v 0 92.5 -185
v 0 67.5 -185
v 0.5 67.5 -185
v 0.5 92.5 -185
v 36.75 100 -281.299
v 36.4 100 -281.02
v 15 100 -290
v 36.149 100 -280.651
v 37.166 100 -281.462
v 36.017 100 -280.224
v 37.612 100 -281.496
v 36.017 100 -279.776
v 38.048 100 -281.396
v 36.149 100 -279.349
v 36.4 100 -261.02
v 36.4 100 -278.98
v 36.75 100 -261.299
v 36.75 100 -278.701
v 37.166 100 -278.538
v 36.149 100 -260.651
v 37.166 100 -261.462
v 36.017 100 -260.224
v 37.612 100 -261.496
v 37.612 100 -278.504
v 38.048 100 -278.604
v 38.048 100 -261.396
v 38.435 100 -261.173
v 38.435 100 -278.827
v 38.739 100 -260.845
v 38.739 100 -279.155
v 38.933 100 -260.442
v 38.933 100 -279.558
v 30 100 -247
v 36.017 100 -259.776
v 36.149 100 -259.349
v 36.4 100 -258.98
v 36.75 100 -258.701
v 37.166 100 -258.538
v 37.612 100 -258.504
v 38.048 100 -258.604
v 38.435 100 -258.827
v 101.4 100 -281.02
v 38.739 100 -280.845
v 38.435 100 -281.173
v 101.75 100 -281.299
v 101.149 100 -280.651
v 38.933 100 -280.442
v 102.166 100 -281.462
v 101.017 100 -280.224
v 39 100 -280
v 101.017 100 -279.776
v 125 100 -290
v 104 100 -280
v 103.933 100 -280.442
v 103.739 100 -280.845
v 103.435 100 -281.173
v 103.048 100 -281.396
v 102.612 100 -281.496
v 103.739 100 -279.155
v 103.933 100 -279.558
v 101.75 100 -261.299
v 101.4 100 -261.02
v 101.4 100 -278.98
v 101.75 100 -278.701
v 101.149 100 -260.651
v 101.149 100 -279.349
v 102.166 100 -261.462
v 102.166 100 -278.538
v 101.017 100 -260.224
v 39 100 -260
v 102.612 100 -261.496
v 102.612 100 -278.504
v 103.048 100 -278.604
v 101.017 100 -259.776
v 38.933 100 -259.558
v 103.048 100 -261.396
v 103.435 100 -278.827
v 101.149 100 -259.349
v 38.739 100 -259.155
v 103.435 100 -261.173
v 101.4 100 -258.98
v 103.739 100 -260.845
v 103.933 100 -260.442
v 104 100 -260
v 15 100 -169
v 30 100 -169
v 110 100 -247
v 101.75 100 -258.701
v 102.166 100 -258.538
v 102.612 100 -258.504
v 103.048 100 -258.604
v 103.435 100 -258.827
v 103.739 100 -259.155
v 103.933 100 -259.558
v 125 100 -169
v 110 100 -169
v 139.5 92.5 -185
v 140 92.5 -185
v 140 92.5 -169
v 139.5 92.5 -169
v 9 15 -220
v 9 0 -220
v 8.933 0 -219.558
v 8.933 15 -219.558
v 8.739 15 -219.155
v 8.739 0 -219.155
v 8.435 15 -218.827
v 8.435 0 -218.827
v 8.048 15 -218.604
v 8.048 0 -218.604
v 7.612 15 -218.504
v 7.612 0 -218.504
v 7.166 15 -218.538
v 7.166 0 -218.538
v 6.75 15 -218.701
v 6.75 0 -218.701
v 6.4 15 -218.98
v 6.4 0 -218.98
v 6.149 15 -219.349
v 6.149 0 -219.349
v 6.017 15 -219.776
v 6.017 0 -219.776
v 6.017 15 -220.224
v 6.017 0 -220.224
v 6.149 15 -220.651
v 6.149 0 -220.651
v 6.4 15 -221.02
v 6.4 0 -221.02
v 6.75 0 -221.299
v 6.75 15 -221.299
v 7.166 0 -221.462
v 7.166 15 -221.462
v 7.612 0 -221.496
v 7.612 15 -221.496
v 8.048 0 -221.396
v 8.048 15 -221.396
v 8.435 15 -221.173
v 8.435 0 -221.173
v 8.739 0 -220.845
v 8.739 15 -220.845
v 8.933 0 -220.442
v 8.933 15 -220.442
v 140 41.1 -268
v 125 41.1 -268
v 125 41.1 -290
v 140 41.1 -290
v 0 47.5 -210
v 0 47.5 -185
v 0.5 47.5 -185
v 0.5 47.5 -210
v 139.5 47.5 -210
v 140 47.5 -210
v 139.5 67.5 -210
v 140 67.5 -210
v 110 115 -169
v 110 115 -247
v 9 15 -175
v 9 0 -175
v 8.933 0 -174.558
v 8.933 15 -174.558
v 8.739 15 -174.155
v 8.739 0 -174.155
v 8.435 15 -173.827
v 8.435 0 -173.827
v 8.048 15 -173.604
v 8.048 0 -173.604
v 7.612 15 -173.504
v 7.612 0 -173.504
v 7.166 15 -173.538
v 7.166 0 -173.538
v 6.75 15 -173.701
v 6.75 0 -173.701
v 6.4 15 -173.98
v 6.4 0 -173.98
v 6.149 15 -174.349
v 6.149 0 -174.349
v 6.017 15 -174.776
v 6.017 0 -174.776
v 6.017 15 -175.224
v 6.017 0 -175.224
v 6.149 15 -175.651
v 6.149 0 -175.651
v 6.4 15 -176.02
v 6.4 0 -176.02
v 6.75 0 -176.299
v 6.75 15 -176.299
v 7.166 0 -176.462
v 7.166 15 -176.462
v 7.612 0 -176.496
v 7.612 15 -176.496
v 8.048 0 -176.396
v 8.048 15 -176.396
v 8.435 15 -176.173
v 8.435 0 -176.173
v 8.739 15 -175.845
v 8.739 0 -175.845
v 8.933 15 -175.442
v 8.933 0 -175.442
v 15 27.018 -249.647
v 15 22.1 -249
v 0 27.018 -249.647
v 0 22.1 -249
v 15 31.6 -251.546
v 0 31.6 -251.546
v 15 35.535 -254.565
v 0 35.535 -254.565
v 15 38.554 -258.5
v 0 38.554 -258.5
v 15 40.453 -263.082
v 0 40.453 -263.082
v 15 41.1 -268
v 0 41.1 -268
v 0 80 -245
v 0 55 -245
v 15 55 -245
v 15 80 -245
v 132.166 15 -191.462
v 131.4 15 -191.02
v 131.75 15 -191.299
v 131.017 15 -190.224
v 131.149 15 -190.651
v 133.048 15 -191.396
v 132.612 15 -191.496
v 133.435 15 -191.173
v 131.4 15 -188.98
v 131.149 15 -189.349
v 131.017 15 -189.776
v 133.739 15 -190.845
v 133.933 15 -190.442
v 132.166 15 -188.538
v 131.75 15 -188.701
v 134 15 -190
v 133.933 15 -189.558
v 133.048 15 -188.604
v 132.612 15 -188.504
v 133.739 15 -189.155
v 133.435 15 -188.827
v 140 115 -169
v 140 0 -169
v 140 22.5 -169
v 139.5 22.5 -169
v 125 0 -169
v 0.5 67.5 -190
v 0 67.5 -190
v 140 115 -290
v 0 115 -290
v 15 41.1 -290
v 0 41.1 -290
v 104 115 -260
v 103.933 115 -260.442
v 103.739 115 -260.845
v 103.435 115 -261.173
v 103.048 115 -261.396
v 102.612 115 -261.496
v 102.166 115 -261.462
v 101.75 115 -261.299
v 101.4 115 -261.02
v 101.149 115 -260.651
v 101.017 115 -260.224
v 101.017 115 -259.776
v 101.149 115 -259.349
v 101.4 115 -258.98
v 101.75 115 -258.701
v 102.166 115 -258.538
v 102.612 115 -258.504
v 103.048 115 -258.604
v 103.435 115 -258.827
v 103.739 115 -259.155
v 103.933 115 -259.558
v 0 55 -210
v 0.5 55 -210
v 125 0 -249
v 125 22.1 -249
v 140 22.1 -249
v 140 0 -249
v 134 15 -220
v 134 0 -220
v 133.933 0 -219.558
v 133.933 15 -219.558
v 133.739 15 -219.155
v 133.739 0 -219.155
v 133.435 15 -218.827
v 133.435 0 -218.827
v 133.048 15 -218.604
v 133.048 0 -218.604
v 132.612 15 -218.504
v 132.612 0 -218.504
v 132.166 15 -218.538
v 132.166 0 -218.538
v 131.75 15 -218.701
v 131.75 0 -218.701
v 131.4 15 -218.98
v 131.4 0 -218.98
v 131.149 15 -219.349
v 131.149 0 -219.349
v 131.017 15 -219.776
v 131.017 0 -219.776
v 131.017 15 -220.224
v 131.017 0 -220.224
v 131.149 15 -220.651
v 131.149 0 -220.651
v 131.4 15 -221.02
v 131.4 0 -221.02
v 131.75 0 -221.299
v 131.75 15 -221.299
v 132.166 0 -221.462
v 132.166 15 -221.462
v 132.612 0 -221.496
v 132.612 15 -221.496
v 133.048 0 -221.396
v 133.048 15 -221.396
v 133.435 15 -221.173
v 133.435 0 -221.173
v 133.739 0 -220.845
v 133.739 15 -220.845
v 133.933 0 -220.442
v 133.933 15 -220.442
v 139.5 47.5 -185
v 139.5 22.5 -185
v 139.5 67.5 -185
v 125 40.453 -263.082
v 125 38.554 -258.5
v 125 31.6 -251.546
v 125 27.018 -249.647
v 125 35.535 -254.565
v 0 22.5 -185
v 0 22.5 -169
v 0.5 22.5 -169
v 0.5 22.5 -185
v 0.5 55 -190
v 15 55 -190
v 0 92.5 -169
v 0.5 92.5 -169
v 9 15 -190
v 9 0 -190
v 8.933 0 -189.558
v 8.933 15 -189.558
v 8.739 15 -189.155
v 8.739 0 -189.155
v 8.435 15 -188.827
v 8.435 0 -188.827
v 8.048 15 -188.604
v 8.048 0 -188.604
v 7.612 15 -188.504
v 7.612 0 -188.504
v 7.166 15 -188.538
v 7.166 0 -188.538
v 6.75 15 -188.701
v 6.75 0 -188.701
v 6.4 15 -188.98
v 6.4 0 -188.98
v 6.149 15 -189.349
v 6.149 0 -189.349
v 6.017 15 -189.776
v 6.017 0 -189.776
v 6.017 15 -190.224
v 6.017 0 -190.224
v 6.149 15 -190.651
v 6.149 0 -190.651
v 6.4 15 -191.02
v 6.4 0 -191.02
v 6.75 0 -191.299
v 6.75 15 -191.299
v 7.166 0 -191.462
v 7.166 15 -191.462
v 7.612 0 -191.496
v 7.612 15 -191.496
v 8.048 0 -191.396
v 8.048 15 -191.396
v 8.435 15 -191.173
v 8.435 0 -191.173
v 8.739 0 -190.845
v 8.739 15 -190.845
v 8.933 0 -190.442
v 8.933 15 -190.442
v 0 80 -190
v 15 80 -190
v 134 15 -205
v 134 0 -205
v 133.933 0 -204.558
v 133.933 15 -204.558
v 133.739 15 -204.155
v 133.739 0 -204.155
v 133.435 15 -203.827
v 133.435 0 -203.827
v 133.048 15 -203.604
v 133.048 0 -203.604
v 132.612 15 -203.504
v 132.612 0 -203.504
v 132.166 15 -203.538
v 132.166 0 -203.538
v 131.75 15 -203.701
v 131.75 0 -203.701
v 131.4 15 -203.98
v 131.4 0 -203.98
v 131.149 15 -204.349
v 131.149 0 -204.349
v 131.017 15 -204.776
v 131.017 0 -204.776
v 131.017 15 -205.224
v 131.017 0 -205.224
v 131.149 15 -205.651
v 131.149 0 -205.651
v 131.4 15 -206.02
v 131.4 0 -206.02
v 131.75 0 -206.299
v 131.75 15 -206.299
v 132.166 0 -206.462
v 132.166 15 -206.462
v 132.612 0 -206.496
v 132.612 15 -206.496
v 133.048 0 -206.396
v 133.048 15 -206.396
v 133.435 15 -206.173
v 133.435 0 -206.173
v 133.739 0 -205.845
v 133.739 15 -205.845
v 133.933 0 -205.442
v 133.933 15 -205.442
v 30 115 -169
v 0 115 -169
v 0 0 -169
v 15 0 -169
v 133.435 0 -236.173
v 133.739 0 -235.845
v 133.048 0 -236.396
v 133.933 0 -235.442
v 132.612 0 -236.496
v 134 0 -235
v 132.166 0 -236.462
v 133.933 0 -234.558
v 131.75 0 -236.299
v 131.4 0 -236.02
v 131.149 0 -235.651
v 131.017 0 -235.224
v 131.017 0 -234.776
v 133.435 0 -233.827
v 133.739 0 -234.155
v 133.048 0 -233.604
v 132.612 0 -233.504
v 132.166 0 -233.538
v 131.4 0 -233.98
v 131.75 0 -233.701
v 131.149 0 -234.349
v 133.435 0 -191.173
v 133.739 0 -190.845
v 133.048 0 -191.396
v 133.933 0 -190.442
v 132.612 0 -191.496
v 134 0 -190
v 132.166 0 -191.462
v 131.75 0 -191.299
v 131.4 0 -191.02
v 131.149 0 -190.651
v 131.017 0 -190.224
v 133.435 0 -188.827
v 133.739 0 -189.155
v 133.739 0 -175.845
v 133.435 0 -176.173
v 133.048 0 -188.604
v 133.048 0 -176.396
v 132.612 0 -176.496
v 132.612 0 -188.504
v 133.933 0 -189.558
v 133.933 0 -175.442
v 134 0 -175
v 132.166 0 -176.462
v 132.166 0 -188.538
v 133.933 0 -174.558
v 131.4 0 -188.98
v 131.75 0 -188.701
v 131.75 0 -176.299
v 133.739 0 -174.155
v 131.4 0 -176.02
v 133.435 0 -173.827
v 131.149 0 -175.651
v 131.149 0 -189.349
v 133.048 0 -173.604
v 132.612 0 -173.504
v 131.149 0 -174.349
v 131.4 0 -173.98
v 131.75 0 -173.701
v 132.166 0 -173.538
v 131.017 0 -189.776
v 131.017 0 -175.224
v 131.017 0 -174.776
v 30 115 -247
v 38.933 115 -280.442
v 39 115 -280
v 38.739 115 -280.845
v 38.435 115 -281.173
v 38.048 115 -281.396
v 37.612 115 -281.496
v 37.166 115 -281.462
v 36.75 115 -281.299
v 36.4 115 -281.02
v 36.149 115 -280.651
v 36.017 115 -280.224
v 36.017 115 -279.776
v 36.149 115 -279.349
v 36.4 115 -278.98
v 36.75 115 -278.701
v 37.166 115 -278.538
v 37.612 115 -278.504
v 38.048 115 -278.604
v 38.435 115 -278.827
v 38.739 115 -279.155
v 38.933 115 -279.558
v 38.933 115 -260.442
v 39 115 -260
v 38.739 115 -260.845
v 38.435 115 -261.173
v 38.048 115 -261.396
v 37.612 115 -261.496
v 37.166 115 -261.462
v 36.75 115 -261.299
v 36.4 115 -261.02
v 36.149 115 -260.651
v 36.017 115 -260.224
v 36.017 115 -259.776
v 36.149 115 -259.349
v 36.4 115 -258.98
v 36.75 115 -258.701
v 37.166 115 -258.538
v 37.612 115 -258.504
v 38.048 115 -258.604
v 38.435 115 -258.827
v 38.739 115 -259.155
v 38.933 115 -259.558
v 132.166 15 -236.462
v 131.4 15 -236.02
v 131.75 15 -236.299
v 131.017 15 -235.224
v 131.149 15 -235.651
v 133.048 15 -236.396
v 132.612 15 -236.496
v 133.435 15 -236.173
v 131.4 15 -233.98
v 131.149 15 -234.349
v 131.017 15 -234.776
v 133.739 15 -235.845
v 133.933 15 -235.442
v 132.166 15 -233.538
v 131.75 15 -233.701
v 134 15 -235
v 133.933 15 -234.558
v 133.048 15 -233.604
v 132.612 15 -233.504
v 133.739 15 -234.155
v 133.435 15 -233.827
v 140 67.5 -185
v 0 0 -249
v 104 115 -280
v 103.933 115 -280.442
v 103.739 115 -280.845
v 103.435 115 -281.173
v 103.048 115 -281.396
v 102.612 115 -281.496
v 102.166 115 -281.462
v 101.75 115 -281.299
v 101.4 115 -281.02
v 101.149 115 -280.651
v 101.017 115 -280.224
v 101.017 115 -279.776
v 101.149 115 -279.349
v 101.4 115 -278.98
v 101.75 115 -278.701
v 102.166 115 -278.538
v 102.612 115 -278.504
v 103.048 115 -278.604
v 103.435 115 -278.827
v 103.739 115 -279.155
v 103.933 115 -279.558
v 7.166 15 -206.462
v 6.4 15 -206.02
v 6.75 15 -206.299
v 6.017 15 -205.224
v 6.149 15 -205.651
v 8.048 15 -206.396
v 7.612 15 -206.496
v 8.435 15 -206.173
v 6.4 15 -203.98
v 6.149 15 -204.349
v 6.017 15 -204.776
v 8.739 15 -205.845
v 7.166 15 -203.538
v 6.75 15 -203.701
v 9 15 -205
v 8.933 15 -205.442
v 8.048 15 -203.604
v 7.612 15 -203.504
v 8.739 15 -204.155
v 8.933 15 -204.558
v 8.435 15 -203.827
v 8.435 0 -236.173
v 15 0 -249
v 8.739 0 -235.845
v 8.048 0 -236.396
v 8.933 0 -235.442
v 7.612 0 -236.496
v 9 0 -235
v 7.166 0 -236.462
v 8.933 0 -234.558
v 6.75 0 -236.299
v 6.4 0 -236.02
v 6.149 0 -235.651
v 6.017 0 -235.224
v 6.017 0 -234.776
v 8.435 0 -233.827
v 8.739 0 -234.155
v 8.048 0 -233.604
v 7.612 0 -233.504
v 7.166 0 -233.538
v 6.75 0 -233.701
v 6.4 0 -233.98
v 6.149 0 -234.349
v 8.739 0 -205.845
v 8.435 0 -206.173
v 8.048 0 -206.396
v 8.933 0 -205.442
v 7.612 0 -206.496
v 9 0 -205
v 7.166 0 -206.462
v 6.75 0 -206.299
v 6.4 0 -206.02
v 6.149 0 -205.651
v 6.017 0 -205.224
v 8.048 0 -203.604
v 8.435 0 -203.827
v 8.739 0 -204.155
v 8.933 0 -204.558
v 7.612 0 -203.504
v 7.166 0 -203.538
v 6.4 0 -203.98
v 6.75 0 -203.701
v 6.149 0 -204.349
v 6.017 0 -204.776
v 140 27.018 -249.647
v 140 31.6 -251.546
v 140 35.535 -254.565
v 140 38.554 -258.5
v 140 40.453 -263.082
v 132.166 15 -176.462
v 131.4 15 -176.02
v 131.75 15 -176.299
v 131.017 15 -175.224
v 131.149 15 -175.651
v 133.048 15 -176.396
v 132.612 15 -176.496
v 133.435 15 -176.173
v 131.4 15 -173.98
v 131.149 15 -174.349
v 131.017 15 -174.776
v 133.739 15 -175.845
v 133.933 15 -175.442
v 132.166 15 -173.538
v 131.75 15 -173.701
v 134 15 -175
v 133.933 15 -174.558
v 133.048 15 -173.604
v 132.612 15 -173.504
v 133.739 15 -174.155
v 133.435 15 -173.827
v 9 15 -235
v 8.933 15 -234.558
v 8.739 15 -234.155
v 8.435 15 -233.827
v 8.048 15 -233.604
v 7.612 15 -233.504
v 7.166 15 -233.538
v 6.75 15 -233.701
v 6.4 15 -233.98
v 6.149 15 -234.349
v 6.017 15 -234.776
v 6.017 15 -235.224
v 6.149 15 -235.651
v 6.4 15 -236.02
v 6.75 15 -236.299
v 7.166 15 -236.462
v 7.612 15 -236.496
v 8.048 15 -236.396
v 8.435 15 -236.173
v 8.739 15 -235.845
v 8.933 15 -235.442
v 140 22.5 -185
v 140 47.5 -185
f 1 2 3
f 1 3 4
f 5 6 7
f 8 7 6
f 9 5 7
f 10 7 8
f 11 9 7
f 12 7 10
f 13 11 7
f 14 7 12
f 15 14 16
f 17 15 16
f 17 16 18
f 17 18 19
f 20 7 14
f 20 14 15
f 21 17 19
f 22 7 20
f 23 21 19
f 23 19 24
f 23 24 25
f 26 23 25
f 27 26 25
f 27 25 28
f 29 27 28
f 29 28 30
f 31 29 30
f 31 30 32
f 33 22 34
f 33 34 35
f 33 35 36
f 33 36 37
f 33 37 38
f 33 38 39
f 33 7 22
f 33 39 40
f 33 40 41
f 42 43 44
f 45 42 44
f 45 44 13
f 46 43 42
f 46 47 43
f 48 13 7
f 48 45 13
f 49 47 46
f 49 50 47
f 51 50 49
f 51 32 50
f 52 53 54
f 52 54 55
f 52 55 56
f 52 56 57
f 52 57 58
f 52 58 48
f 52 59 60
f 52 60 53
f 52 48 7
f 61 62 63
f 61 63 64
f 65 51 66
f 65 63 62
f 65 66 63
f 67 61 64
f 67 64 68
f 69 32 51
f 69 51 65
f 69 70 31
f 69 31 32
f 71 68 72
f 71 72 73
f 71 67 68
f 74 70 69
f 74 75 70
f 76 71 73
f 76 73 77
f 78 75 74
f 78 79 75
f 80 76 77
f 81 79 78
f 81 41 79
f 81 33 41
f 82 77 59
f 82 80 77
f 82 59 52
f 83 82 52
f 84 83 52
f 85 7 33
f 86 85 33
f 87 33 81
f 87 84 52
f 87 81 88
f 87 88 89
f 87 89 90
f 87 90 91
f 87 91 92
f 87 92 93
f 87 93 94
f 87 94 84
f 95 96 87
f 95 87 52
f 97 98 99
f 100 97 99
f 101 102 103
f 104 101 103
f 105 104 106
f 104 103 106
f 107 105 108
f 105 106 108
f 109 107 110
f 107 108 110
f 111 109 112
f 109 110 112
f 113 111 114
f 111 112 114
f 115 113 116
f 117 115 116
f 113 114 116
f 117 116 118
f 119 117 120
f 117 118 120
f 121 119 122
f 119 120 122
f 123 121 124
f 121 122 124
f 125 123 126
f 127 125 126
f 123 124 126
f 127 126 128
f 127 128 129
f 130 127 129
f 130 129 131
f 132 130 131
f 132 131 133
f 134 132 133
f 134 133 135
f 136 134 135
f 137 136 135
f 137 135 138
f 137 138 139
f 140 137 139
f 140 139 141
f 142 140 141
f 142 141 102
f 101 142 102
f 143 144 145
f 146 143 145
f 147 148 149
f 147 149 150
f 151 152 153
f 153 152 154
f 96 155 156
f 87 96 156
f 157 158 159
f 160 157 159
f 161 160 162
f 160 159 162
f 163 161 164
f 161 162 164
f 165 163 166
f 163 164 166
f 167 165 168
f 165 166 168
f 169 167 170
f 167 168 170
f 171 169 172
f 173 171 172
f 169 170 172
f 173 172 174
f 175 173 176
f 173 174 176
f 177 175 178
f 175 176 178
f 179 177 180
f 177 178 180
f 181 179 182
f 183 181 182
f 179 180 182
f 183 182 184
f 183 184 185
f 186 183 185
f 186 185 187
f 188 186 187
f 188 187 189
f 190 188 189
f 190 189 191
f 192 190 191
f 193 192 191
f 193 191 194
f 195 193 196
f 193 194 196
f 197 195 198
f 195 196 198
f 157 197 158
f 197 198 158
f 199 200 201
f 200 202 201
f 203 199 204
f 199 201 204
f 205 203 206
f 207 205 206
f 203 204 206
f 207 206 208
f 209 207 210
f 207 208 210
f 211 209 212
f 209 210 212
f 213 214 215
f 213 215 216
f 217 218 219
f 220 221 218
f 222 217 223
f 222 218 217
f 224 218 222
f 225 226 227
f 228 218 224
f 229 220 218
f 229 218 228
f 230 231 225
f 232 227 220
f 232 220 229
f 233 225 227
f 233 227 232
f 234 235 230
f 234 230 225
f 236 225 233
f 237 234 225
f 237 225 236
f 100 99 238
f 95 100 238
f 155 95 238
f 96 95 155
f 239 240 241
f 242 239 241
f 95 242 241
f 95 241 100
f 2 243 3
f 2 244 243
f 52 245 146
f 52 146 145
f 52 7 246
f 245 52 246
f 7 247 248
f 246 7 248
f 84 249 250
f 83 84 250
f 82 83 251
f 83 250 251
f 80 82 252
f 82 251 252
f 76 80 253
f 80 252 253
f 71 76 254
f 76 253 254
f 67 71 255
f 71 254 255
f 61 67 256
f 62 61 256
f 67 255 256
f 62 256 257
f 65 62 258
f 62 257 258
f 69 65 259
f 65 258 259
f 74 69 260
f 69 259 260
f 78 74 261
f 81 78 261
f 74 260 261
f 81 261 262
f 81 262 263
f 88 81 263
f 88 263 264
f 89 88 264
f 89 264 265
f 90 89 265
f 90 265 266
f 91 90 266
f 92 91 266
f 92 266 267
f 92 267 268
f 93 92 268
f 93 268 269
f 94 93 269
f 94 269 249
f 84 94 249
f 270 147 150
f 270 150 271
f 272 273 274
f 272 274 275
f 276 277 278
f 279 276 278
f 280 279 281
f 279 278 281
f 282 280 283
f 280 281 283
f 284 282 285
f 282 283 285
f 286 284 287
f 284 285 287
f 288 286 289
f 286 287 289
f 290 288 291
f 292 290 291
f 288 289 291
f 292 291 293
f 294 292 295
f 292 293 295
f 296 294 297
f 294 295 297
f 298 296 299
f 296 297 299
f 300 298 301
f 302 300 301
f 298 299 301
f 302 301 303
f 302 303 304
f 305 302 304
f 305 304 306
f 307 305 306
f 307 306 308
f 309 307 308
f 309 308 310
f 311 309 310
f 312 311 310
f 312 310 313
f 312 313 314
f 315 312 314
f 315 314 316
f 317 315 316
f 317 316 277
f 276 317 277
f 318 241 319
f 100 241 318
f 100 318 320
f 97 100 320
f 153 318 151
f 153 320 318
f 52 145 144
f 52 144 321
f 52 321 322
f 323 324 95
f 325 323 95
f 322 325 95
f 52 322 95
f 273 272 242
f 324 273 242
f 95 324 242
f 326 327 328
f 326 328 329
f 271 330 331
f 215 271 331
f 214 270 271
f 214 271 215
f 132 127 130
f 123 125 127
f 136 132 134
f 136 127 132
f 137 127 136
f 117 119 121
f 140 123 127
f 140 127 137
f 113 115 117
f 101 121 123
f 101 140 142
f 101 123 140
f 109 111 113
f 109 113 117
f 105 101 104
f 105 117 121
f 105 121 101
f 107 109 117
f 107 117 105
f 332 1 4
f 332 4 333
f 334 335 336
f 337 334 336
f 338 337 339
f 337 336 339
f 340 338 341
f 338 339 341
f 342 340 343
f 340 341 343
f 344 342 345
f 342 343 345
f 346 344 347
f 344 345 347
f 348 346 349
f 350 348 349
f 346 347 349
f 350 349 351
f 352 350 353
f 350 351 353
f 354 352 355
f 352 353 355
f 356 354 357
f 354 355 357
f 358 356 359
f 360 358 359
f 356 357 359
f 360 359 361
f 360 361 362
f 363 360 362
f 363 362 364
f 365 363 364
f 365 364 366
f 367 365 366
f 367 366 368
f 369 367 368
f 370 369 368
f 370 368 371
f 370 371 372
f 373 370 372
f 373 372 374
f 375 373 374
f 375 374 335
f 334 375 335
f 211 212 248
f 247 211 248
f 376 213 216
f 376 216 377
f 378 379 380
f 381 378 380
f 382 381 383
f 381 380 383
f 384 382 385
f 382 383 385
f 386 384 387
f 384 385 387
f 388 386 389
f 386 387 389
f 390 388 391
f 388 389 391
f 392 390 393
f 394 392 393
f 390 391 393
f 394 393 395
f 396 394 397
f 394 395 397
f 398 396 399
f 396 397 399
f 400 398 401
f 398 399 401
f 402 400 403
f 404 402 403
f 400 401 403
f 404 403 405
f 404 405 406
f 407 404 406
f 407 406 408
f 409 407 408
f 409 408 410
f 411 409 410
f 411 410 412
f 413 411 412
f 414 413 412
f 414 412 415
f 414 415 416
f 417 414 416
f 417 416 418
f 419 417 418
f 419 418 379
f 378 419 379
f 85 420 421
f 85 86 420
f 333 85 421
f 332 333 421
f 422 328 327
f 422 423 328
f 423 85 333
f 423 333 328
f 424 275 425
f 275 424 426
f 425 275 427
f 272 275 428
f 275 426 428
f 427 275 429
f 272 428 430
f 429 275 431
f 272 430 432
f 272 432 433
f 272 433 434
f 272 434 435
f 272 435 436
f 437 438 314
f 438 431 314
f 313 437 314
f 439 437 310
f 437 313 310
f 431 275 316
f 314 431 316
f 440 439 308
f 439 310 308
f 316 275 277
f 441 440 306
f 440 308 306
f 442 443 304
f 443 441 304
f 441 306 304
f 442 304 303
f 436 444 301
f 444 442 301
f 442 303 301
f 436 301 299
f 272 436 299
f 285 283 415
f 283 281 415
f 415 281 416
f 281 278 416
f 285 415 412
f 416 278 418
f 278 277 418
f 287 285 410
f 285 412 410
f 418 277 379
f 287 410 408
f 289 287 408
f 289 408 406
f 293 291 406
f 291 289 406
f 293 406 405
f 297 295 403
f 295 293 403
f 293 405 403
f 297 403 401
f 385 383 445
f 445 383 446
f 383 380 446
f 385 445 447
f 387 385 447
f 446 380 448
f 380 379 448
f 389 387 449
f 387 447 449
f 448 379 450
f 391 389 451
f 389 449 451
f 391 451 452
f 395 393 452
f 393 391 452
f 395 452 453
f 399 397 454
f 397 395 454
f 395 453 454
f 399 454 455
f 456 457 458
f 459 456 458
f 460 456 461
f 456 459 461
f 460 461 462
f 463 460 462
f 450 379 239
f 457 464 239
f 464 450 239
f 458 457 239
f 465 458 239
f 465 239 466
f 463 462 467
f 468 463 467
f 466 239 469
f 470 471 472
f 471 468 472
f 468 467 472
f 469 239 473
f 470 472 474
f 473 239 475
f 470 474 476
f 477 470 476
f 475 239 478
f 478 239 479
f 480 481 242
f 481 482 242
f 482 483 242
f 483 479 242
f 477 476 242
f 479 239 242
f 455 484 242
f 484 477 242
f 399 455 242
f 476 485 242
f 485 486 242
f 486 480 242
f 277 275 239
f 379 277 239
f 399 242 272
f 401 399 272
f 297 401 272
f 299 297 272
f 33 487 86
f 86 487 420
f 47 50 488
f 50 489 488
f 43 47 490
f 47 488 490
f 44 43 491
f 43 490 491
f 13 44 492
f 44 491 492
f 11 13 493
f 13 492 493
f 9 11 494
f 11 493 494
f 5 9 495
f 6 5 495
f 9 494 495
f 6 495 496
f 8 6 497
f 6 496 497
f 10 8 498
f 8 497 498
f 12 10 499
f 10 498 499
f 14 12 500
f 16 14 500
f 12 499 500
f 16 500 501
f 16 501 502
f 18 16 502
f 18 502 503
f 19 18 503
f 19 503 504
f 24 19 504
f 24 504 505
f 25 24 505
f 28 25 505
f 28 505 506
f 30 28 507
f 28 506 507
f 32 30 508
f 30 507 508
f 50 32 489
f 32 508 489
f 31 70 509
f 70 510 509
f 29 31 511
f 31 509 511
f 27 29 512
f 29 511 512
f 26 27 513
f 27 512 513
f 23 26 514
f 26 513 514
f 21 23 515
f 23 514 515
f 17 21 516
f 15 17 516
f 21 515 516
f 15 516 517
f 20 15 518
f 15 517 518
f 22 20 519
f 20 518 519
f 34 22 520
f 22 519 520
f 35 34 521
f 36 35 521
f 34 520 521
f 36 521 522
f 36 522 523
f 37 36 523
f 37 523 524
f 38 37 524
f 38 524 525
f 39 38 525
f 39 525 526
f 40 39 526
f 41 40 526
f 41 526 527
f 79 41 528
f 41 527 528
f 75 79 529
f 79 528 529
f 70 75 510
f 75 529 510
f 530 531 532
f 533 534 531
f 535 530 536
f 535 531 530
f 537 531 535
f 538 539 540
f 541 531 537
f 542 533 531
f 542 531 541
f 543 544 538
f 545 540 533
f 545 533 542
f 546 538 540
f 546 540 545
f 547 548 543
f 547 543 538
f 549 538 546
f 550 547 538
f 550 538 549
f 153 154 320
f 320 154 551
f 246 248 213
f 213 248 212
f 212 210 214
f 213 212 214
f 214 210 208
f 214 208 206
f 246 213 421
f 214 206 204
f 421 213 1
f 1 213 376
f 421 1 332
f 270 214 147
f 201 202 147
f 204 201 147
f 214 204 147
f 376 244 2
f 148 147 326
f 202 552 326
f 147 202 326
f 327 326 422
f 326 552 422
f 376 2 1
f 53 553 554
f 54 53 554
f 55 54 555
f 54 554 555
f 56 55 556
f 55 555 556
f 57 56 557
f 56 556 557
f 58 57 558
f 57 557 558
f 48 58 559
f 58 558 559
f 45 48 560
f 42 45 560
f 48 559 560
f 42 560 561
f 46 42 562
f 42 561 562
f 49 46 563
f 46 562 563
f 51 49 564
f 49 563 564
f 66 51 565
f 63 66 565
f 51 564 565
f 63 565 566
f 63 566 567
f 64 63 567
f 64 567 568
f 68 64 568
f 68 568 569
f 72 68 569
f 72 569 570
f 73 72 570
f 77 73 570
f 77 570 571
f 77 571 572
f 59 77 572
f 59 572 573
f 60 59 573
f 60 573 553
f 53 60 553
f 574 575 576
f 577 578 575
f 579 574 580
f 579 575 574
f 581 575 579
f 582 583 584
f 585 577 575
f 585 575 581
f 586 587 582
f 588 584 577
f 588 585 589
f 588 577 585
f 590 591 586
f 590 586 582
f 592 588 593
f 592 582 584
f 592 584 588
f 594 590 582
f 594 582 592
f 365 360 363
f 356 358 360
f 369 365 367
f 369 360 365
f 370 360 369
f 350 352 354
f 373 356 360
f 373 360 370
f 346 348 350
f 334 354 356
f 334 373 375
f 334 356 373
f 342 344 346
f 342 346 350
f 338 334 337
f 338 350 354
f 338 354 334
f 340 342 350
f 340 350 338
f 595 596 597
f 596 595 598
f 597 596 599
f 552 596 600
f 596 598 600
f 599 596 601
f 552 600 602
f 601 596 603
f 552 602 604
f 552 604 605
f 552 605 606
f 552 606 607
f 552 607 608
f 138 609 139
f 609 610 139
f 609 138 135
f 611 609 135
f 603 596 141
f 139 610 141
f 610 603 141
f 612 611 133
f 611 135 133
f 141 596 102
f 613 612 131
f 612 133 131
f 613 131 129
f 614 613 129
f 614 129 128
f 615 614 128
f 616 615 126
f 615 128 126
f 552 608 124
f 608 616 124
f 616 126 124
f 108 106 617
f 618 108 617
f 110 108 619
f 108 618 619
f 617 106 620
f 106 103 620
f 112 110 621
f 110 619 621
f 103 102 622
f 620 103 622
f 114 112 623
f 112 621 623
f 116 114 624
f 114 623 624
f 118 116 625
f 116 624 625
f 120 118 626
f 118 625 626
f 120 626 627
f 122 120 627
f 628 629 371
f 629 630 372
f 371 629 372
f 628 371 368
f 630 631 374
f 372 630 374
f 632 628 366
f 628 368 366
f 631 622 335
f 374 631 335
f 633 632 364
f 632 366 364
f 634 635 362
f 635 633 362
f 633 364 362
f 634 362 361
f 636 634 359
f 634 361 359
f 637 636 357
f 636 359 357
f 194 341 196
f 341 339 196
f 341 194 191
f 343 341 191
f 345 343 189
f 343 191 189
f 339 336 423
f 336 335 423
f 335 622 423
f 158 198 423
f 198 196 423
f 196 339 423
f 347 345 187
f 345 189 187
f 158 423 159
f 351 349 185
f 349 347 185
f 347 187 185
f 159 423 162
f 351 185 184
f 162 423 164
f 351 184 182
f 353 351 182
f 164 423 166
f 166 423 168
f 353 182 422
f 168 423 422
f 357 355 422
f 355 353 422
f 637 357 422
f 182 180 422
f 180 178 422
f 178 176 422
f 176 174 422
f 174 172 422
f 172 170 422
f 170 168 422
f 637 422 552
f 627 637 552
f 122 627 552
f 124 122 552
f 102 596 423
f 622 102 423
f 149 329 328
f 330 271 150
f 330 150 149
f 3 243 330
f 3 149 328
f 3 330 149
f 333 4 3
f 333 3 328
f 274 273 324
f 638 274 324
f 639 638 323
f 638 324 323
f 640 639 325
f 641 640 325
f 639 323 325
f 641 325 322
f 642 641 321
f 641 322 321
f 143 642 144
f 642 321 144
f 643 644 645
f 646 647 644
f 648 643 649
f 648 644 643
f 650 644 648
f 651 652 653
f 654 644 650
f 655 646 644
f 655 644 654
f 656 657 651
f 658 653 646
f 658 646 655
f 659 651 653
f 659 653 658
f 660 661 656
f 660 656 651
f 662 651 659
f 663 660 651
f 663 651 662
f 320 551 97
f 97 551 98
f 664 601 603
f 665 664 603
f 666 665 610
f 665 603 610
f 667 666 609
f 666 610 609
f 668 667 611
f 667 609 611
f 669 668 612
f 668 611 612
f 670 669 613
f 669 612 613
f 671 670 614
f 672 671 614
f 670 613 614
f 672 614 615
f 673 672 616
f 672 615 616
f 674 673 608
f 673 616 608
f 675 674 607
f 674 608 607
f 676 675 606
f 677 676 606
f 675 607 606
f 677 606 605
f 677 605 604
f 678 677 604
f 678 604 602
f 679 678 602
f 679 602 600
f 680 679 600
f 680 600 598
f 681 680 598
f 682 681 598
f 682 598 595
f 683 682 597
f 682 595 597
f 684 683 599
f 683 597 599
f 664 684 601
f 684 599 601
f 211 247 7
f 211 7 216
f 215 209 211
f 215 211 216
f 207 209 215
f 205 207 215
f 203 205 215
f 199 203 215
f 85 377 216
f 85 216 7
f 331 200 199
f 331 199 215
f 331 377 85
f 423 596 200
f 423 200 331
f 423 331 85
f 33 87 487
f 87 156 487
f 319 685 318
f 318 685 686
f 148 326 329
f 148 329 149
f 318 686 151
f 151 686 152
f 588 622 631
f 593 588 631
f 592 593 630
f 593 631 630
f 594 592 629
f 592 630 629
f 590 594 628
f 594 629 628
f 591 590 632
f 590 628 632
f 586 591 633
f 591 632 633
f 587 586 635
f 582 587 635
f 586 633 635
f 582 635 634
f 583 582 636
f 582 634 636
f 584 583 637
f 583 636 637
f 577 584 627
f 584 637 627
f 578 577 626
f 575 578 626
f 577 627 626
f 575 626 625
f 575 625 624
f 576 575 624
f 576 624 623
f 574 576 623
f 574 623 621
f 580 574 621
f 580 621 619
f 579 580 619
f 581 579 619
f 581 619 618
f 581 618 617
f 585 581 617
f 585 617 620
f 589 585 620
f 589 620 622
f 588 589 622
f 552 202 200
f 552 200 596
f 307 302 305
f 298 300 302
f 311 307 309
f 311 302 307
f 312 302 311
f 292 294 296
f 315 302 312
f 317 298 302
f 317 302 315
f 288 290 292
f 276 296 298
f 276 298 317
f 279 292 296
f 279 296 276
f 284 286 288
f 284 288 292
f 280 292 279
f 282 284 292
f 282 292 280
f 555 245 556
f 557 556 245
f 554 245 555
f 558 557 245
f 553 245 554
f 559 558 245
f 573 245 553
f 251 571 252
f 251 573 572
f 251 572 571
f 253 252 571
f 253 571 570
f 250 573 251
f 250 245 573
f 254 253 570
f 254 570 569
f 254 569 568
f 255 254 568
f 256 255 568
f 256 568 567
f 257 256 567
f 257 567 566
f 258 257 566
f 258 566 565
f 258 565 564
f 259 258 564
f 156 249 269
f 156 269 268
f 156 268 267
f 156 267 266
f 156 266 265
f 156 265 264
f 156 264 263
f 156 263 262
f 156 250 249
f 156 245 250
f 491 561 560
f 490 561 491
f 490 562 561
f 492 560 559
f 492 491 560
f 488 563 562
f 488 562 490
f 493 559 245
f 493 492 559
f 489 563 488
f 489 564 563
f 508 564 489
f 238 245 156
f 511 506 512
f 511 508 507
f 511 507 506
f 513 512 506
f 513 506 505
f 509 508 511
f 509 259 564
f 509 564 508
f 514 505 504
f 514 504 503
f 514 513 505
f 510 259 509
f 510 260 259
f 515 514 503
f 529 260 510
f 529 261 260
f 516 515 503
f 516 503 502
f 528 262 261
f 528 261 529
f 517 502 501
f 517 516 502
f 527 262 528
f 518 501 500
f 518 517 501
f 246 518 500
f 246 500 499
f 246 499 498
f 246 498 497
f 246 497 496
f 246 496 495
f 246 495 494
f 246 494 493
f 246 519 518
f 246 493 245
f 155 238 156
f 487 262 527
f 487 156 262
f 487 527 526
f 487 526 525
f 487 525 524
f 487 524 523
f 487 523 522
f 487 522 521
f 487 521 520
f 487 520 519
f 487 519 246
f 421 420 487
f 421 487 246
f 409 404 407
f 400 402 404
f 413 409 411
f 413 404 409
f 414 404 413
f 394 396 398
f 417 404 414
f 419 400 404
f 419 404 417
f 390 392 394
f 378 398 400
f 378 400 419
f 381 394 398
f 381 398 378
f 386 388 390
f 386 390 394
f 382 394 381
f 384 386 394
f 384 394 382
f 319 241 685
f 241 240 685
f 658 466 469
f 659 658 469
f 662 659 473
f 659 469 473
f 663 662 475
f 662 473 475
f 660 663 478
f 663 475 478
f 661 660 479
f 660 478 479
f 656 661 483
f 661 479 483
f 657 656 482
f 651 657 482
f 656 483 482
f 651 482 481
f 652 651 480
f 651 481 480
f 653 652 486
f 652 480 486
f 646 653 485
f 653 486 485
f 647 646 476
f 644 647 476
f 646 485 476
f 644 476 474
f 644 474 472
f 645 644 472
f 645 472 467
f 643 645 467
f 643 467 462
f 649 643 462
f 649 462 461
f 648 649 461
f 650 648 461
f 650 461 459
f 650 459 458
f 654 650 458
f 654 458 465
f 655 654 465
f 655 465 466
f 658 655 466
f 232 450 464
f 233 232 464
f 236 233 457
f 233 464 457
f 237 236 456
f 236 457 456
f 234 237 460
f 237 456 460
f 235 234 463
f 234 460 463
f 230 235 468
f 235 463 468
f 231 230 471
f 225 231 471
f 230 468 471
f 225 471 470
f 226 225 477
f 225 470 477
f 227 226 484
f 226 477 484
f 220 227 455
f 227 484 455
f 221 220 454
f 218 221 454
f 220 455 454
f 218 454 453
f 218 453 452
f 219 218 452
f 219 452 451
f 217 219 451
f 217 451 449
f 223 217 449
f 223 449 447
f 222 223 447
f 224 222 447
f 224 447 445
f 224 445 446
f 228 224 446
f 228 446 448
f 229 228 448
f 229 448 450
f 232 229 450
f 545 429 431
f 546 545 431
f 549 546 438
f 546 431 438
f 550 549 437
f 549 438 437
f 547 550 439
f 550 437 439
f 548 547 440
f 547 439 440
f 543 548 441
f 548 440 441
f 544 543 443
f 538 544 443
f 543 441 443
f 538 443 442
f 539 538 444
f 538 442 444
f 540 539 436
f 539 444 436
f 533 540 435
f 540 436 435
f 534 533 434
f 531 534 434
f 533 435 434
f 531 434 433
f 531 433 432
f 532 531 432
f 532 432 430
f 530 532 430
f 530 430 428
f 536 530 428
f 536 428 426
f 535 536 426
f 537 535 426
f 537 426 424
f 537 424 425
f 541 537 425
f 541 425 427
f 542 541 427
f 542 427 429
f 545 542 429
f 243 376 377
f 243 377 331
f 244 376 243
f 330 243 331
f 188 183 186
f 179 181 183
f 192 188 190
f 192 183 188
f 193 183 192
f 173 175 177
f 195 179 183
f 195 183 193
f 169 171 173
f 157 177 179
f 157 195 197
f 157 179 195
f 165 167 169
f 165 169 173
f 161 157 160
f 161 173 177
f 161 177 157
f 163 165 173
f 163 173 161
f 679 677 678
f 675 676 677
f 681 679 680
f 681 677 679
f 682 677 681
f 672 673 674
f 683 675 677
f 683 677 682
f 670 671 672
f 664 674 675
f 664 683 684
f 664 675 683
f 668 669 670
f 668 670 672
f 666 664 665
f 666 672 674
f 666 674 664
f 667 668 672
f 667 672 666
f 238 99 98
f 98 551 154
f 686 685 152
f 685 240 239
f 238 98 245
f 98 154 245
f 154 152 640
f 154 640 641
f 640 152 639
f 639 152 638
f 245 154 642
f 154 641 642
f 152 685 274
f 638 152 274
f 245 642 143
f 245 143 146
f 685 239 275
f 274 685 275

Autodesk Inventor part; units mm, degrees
sketch "Sketch1" plane through (0, 0, 0) normal (0, 1, 0) x (-1, 0, 0)
  line L0 (0, 0) -> (-140, 0)
  line L1 (-140, 0) -> (-140, -290)
  line L2 (-140, -290) -> (0, -290)
  line L3 (0, -290) -> (0, 0)
  line L4 (0, -70) -> (-50, 0)
  line L5 (-90, 0) -> (-140, -70)
  dimension "d0" = 290
  dimension "d1" = 140
  dimension "d2" = 70
  dimension "d3" = 50
  dimension "d4" = 50
extrude "Extrusion1" add sketch "Sketch1" along normal blind 115 contours L4 L3 L2 L1 L5 L0
sketch "Sketch2" plane through (140, 0, -70) normal (1, 0, 0) x (0, 0, -1)
  line L0 (-70, 0) -> (-70, 115) projected
  line L1 (-70, 45) -> (0, 65)
  line L2 (0, 0) -> (0, 115) projected
  line L3 (0, 65) -> (40, 115)
  line L4 (220, 115) -> (0, 115) projected
  line L5 (-70, 0) -> (0, 0) projected
  line L6 (0, 0) -> (0, 115) projected
  line L7 (-70, 115) -> (0, 115) projected
  line L8 (-70, 0) -> (-70, 115) projected
  point P0 (0, 115)
  dimension "d7" = 20
  dimension "d8" = 45
  dimension "d9" = 40
extrude "Extrusion2" cut sketch "Sketch2" against normal up to next contours L0 L7 L2 L1
extrude "Extrusion3" cut sketch "Sketch2" against normal up to next contours L2 L4 L3
sketch "Sketch5" plane through (50, 45, 0) normal (0, 0.9615, 0.2747) x (1, 0, 0)
  line L0 (90, 72.8011) -> (-50, 72.8011) projected
  line L1 (-50, 298.0724) -> (-50, 124.9981) projected
  point P0 (-50, -12.3625)
  point P1 (20, 52.8011)
  dimension "d17" = 20
  dimension "d18" = 70
ref_plane "Work Plane2" through (70, 115, -110) normal (0.1295, 0.7236, 0.678) x (0, -0.6837, 0.7297)
sketch "Sketch7" plane through (70, 115, -110) normal (0.1295, 0.7236, 0.678) x (0, -0.6837, 0.7297)
  line L0 (0, -69.411) -> (0, 69.411) projected
  line L1 (0, 69.411) -> (-131.3545, 85.3428) projected
  line L2 (-131.3545, 85.3428) -> (-131.3545, -53.4792) projected
  line L3 (-131.3545, -53.4792) -> (0, -69.411) projected
  line L4 (63.3757, -68.2279) -> (0, -69.411) projected
  line L5 (63.3757, 70.594) -> (63.3757, -68.2279) projected
  line L6 (0, 69.411) -> (63.3757, 70.594) projected
  line L7 (0, -69.411) -> (0, 69.411) projected
  line L8 (0, 69.411) -> (63.3757, 70.594) projected
  line L9 (107.8174, 76.7345) -> (63.3757, 70.594) projected
  line L10 (107.8174, 76.7345) -> (-52.727, 96.2066) projected
  line L11 (-52.727, 96.2066) -> (-131.3545, 85.3428) projected
  line L12 (0, 69.411) -> (-131.3545, 85.3428) projected
  line L13 (128.1324, -22.955) -> (63.3757, -68.2279) projected
  line L14 (128.1324, 16.7084) -> (128.1324, -22.955) projected
  line L15 (63.3757, 70.594) -> (128.1324, 16.7084) projected
  line L16 (63.3757, 70.594) -> (63.3757, -68.2279) projected
  line L17 (63.3757, 70.594) -> (128.1324, 16.7084) projected
  line L18 (158.8997, 20.9595) -> (128.1324, 16.7084) projected
  line L19 (158.8997, 20.9595) -> (107.8174, 76.7345) projected
  line L20 (107.8174, 76.7345) -> (63.3757, 70.594) projected
  line L21 (128.1324, 16.7084) -> (128.1324, -22.955) projected
  line L22 (107.8174, -62.0875) -> (63.3757, -68.2279) projected
  line L23 (107.8174, -62.0875) -> (158.8997, -18.7039) projected
  line L24 (128.1324, 16.7084) -> (128.1324, -22.955) projected
  line L25 (158.8997, -18.7039) -> (128.1324, -22.955) projected
  line L26 (158.8997, -18.7039) -> (158.8997, 20.9595) projected
  line L27 (158.8997, 20.9595) -> (128.1324, 16.7084) projected
  line L28 (0, 0) -> (81.1658, 0)
  line L29 (81.1658, 0) -> (63.3757, 70.594)
  line L30 (0, 0) -> (63.3757, 70.594)
  point P0 (158.8997, -68.2832)
extrude "Extrusion4" cut sketch "Sketch7" along normal up to next contours L3 L2 L1 L0 | L0 L28 L5 L4 | L30 L5 L28 | L0 L6 L30 | L1 L11 L10 L9 L6
extrude "Extrusion5" add sketch "Sketch7" against normal blind 20 contours L30 L5 L28 | L5 L29 L28
ref_plane "Work Plane3" through (70, 115, -110) normal (0.1295, -0.7236, -0.678) x (0, -0.6837, 0.7297)
sketch "Sketch9" plane through (70, 115, -110) normal (0.1295, -0.7236, -0.678) x (0, -0.6837, 0.7297)
  line L0 (81.1658, 0) -> (63.3757, 2.3661) projected
  line L1 (-131.3545, 85.3428) -> (0, 69.411) projected
  line L2 (81.1658, 0) -> (0, 0)
  line L3 (0, 0) -> (0, 69.411)
  line L4 (0, 69.411) -> (81.1658, 69.411)
  line L5 (81.1658, 69.411) -> (81.1658, 0)
  line L6 (0, 0) -> (-9.7539, -68.2279) projected
  line L7 (0, 0) -> (-9.7539, -68.2279) projected
  line L8 (-9.7539, -68.2279) -> (-131.3545, -53.4792) projected
  line L9 (-131.3545, -53.4792) -> (-131.3545, 85.3428) projected
  line L10 (-131.3545, 85.3428) -> (0, 69.411) projected
  line L11 (0, 69.411) -> (0, 0) projected
  line L12 (0, 0) -> (81.1658, 0) projected
  line L13 (93.1192, -47.4335) -> (81.1658, 0) projected
  line L14 (148.2908, -20.1697) -> (93.1192, -47.4335) projected
  line L15 (153.1835, 20.1697) -> (148.2908, -20.1697) projected
  line L16 (63.3757, 70.594) -> (153.1835, 20.1697) projected
  line L17 (81.1658, 0) -> (63.3757, 70.594) projected
  line L18 (0, 0) -> (-9.7539, 70.594) projected
  line L19 (63.3757, 70.594) -> (0, 0) projected
  line L20 (-9.7539, 70.594) -> (63.3757, 70.594) projected
  line L21 (0, 0) -> (81.1658, 0) projected
  line L22 (0, 0) -> (-9.7539, 70.594) projected
  line L23 (63.3757, 70.594) -> (0, 0) projected
  line L24 (0, 0) -> (81.1658, 0) projected
  line L25 (0, 0) -> (-9.7539, 70.594) projected
  line L26 (63.3757, 70.594) -> (0, 0) projected
  line L27 (93.1192, -47.4335) -> (81.1658, 0) projected
  line L28 (148.2908, -20.1697) -> (93.1192, -47.4335) projected
  line L29 (153.1835, 20.1697) -> (148.2908, -20.1697) projected
  line L30 (63.3757, 70.594) -> (153.1835, 20.1697) projected
  line L31 (81.1658, 0) -> (63.3757, 70.594) projected
  line L32 (-9.7539, 70.594) -> (63.3757, 70.594) projected
  line L33 (93.1192, -47.4335) -> (81.1658, 0) projected
  line L34 (148.2908, -20.1697) -> (93.1192, -47.4335) projected
  line L35 (153.1835, 20.1697) -> (148.2908, -20.1697) projected
  line L36 (63.3757, 70.594) -> (153.1835, 20.1697) projected
  line L37 (81.1658, 0) -> (63.3757, 70.594) projected
  line L38 (-9.7539, 70.594) -> (63.3757, 70.594) projected
  point P0 (158.8997, 70.5388)
  point P1 (62.3137, 69.411)
  point P2 (63.6739, 69.411)
  point P3 (65.4828, 69.411)
extrude "Extrusion7" cut sketch "Sketch9" against normal blind 20 contours L20 L19 L4 L1 | L1 L3 L18 | L4 L19 L3
extrude "Extrusion8" add sketch "Sketch9" along normal blind 20 contours L19 L4 L17 L2 | L16 L4 L17 | L17 L4 L19 | L17 L4 L16 L5 | L5 L16 L15 L14 L13
sketch "Sketch10" plane through (140, 0, -290) normal (0, 0, -1) x (-1, 0, 0)
  line L0 (140, 0) -> (0, 0)
  line L1 (0, 0) -> (0, -20)
  line L2 (0, -20) -> (140, -20)
  line L3 (140, -20) -> (140, 0)
  dimension "d31" = 20
extrude "Extrusion9" cut sketch "Sketch10" against normal up to next
ref_plane "Work Plane5" through (0, 15, 0) normal (0, -1, 0) x (1, 0, 0)
sketch "Sketch11" plane through (0, 15, 0) normal (0, -1, 0) x (1, 0, 0)
  line L0 (50, 0) -> (0, -70) projected
  line L1 (0, -70) -> (25, -63.132)
  line L2 (70, -50.7695) -> (0, -70) projected
  line L3 (25, -63.132) -> (50, 0)
  line L4 (90, 0) -> (140, -70) projected
  line L5 (90, 0) -> (140, -70)
  line L6 (140, -70) -> (70, -50.7695)
  line L7 (50, 0) -> (90, 0) projected
  line L8 (90, 0) -> (115, -63.132)
  line L9 (34.8321, -38.3031) -> (17.8321, -45.035)
  line L10 (105.1679, -38.3031) -> (122.1679, -45.035)
  line L11 (34.8321, -38.3031) -> (50, 0)
  line L12 (105.1679, -38.3031) -> (90, 0)
  line L13 (122.1679, -45.035) -> (90, 0)
  line L14 (17.8321, -45.035) -> (50, 0)
  point P0 (0, 0)
  dimension "d36" = 25
  dimension "d37" = 25
  dimension "d40" = 17
  dimension "d41" = 17
extrude "Extrusion10" cut sketch "Sketch11" against normal up to next contours L3 L9 L0 | L4 L10 L8
ref_plane "Work Plane6" through (0, 35, 0) normal (0, -1, 0) x (1, 0, 0)
sketch "Sketch12" plane through (0, 35, 0) normal (0, -1, 0) x (1, 0, 0)
  line L0 (114.8999, -25) -> (99.8999, -25)
  line L1 (99.8999, -25) -> (99.8999, -50)
  line L2 (99.8999, -50) -> (114.8999, -50)
  line L3 (114.8999, -50) -> (114.8999, -25)
  line L4 (90, 0) -> (105.1679, -38.3031) projected
  line L5 (34.8321, -38.3031) -> (50, 0) projected
  line L6 (40.1001, -25) -> (25.1001, -25)
  line L7 (25.1001, -25) -> (25.1001, -50)
  line L8 (25.1001, -50) -> (40.1001, -50)
  line L9 (40.1001, -50) -> (40.1001, -25)
  point P0 (0, 0)
  point P1 (114.8999, -37.5)
  point P2 (99.8999, -37.5)
  point P3 (107.3999, -25)
  point P4 (107.3999, -50)
  point P5 (32.6001, -25)
  dimension "d43" = 15
  dimension "d44" = 25
  dimension "d45" = 25
  dimension "d46" = 15
  dimension "d47" = 25
  dimension "d48" = 25
extrude "Extrusion11" add sketch "Sketch12" along normal blind 7.5 and the other way blind 7.5
sketch "Sketch13" plane through (25.1001, 27.5, -25) normal (0, 0, 1) x (1, 0, 0)
  line L0 (0, 15) -> (15, 15) projected
  line L1 (15, 15) -> (15, 0) projected
  line L2 (15, 0) -> (0, 0) projected
  line L3 (0, 0) -> (0, 15) projected
  line L4 (15, 15) -> (15, 24.6429) projected
  line L5 (15, 24.6429) -> (74.7998, 24.6429) projected
  line L6 (74.7998, 24.6429) -> (74.7998, 15) projected
  line L7 (74.7998, 0) -> (74.7998, 15) projected
  line L8 (89.7998, 0) -> (74.7998, 0) projected
  line L9 (89.7998, 15) -> (89.7998, 0) projected
  line L10 (74.7998, 15) -> (89.7998, 15) projected
  line L11 (15, -12.5) -> (15, 0) projected
  line L12 (7.0428, -12.5) -> (15, -12.5) projected
  line L13 (7.0428, -27.5) -> (7.0428, -12.5) projected
  line L14 (82.757, -27.5) -> (7.0428, -27.5) projected
  line L15 (82.757, -12.5) -> (82.757, -27.5) projected
  line L16 (74.7998, -12.5) -> (82.757, -12.5) projected
  line L17 (74.7998, 0) -> (74.7998, -12.5) projected
  line L18 (2, 15) -> (2, 0)
  line L19 (13, 15) -> (13, 0)
  line L20 (0, 13) -> (15, 13)
  line L21 (0, 2) -> (15, 2)
  line L22 (74.7998, 13) -> (89.7998, 13)
  line L23 (74.7998, 2) -> (89.7998, 2)
  line L24 (76.7998, 15) -> (76.7998, 0)
  line L25 (89.7998, 0) -> (80.0678, 0) projected
  line L26 (87.7998, 15) -> (87.7998, 0)
  line L27 (2, 13) -> (13, 13)
  line L28 (13, 13) -> (13, 2)
  line L29 (13, 2) -> (2, 2)
  line L30 (2, 2) -> (2, 13)
  line L31 (76.7998, 13) -> (87.7998, 13)
  line L32 (87.7998, 13) -> (87.7998, 2)
  line L33 (87.7998, 2) -> (76.7998, 2)
  line L34 (76.7998, 2) -> (76.7998, 13)
  line L35 (0, 15) -> (15, 15) projected
  line L36 (0, 15) -> (15, 15)
  line L37 (15, 15) -> (15, 0)
  line L38 (15, 0) -> (0, 0)
  line L39 (0, 0) -> (0, 15)
  line L40 (74.7998, 15) -> (80.0678, 15) projected
  line L41 (74.7998, 15) -> (89.7998, 15)
  line L42 (89.7998, 15) -> (89.7998, 0)
  line L43 (89.7998, 0) -> (74.7998, 0)
  line L44 (74.7998, 0) -> (74.7998, 15)
  point P0 (-25.1001, -27.5)
  point P1 (7.5, 0)
  point P2 (7.5, 2)
  point P3 (87.7998, 13)
  point P4 (13, 13)
  point P5 (2, 2)
  dimension "d53" = 2
  dimension "d54" = 11
  dimension "d55" = 2
  dimension "d56" = 11
  dimension "d57" = 2
  dimension "d58" = 11
  dimension "d59" = 2
  dimension "d60" = 2
extrude "Extrusion12" add sketch "Sketch13" along normal blind 7.5 contours L0 L18 L20 L3 | L0 L19 L20 L18 | L20 L18 L21 L3 | L0 L1 L20 L19 | L21 L18 L2 L3 | L20 L1 L21 L19 | L21 L19 L2 L18 | L21 L1 L2 L19 | L10 L24 L22 L7 | L22 L24 L23 L7 | L10 L26 L22 L24 | L23 L24 L8 L7 | L23 L26 L8 L24 | L26 L10 L9 L22 | L22 L9 L23 L26 | L23 L9 L8 L26
sketch "Sketch14" plane through (50, 0, 0) normal (0, 0, 1) x (1, 0, 0)
  line L0 (3.0769, 39) -> (6.1538, 39)
  line L1 (6.1538, 39) -> (6.1538, 6)
  line L2 (6.1538, 6) -> (3.0769, 6)
  line L3 (3.0769, 6) -> (3.0769, 39)
  line L4 (9.2308, 39) -> (12.3077, 39)
  line L5 (12.3077, 39) -> (12.3077, 6)
  line L6 (12.3077, 6) -> (9.2308, 6)
  line L7 (9.2308, 6) -> (9.2308, 39)
  line L8 (15.3846, 39) -> (18.4615, 39)
  line L9 (18.4615, 39) -> (18.4615, 6)
  line L10 (18.4615, 6) -> (15.3846, 6)
  line L11 (15.3846, 6) -> (15.3846, 39)
  line L12 (21.5385, 39) -> (24.6154, 39)
  line L13 (24.6154, 39) -> (24.6154, 6)
  line L14 (24.6154, 6) -> (21.5385, 6)
  line L15 (21.5385, 6) -> (21.5385, 39)
  line L16 (27.6923, 39) -> (30.7692, 39)
  line L17 (30.7692, 39) -> (30.7692, 6)
  line L18 (30.7692, 6) -> (27.6923, 6)
  line L19 (27.6923, 6) -> (27.6923, 39)
  line L20 (33.8462, 39) -> (36.9231, 39)
  line L21 (36.9231, 39) -> (36.9231, 6)
  line L22 (36.9231, 6) -> (33.8462, 6)
  line L23 (33.8462, 6) -> (33.8462, 39)
  line L24 (0, 15) -> (0, 45) projected
  line L25 (40, 45) -> (0, 45) projected
  line L26 (0, 0) -> (40, 0) projected
  point P0 (-50, 0)
  point P1 (16.9231, 39)
  point P2 (35.3846, 6)
  dimension "d63" = 3.0769
  dimension "d64" = 3.0769
  dimension "d65" = 3.0769
  dimension "d66" = 3.0769
  dimension "d67" = 3.0769
  dimension "d68" = 3.0769
  dimension "d69" = 3.0769
  dimension "d70" = 3.0769
  dimension "d71" = 3.0769
  dimension "d72" = 3.0769
  dimension "d73" = 3.0769
  dimension "d74" = 3.0769
  dimension "d75" = 6
  dimension "d76" = 6
extrude "Extrusion13" cut sketch "Sketch14" against normal blind 7.5
sketch "Sketch15" plane through (70, 115, -110) normal (0.1295, 0.7236, 0.678) x (0.9916, -0.0945, -0.0885)
  line L0 (8, -6.9706) -> (62.594, 0.5726)
  line L1 (62.594, 0.5726) -> (62.594, -57.1417)
  line L2 (62.594, -57.1417) -> (8, -70.8996)
  line L3 (8, -70.8996) -> (8, -6.9706)
  line L4 (0, 0) -> (0, -81.1658) projected
  line L5 (0, 0) -> (70.594, 9.7539) projected
  line L6 (70.594, 9.7539) -> (70.594, -63.3757) projected
  line L7 (70.594, -63.3757) -> (0, -81.1658) projected
  point P0 (-68.2832, -158.8997)
  dimension "d79" = 8
  dimension "d80" = 8
  dimension "d81" = 8
  dimension "d82" = 8
extrude "Extrusion14" cut sketch "Sketch15" against normal blind 1 contours L0 L1 L2 L3
sketch "Sketch16" plane through (70, 115, -110) normal (-0.1295, 0.7236, 0.678) x (0.9916, 0.0945, 0.0885)
  line L0 (-8, -70.8996) -> (-62.594, -57.1417)
  line L1 (-62.594, -57.1417) -> (-62.594, 0.5726)
  line L2 (-62.594, 0.5726) -> (-8, -6.9706)
  line L3 (-8, -6.9706) -> (-8, -70.8996)
  line L4 (-70.594, 9.7539) -> (0, 0) projected
  line L5 (0, 0) -> (0, -81.1658) projected
  line L6 (0, -81.1658) -> (-70.594, -63.3757) projected
  line L7 (-70.594, -63.3757) -> (-70.594, 9.7539) projected
  point P0 (-70.5388, -158.8997)
  point P1 (0, -40.5829)
  dimension "d85" = 8
  dimension "d86" = 8
  dimension "d87" = 8
  dimension "d88" = 8
extrude "Extrusion15" cut sketch "Sketch16" against normal blind 1 contours L0 L1 L2 L3
sketch "Sketch17" plane through (0, 0, 0) normal (0, -1, 0) x (1, 0, 0)
  line L0 (90, 0) -> (140, -70) projected
  line L1 (140, -70) -> (140, -290) projected
  line L2 (140, -290) -> (0, -290) projected
  line L3 (0, -290) -> (0, -70) projected
  line L4 (0, -70) -> (50, 0) projected
  line L5 (50, 0) -> (90, 0) projected
  line L6 (0, -123.3662) -> (70, -110) projected
  line L7 (70, -110) -> (140, -123.3662) projected
  line L8 (140, -123.3662) -> (140, -290) projected
  line L9 (140, -290) -> (0, -290) projected
  line L10 (0, -290) -> (0, -123.3662) projected
  line L11 (125, -290) -> (15, -290)
  line L12 (15, -290) -> (15, -120.502)
  line L13 (15, -120.502) -> (125, -120.502)
  line L14 (125, -120.502) -> (125, -290)
  line L15 (140, -70) -> (0, -70)
  line L16 (131.9379, -116.636) -> (131.9379, -74.5192) projected
  line L17 (140, -290) -> (0, -290) projected
  point P0 (0, 0)
  point P1 (125, -205.251)
  point P2 (15, -290)
  dimension "d91" = 15
  dimension "d92" = 15
extrude "Extrusion16" cut sketch "Sketch17" against normal blind 100 contours L14 L2 L12 L13
sketch "Sketch18" plane through (0, 0, 0) normal (0, -1, 0) x (1, 0, 0)
  line L0 (0, -123.3662) -> (70, -110) projected
  line L1 (15, -120.502) -> (15, -72.6132)
  line L2 (62.1968, -59.6473) -> (8.0621, -74.5192) projected
  line L3 (70, -110) -> (140, -123.3662) projected
  line L4 (125, -120.502) -> (125, -71.8997)
  line L5 (132.0673, -73.8412) -> (77.9327, -58.9693) projected
  line L6 (125, -120.502) -> (125, -290) projected
  line L7 (15, -290) -> (15, -120.502) projected
  line L8 (70, -110) -> (70, -50.7695) projected
  line L9 (125, -71.8997) -> (70, -50.7695)
  line L10 (70, -50.7695) -> (15, -72.6132)
  line L11 (125, -120.502) -> (15, -120.502)
  point P0 (0, 0)
extrude "Extrusion17" cut sketch "Sketch18" against normal blind 55
chamfer "Chamfer1" distance 45 angle 45 1 edges at (70, 55, -120.502)
sketch "Sketch19" plane through (0, 115, 0) normal (0, 1, 0) x (1, 0, 0)
  line L0 (110, 247) -> (30, 247)
  line L1 (30, 247) -> (30, 142)
  line L2 (30, 142) -> (110, 142)
  line L3 (110, 142) -> (110, 247)
  line L4 (140, 290) -> (0, 290) projected
  line L5 (0, 290) -> (0, 123.3662) projected
  line L6 (140, 123.3662) -> (140, 290) projected
  point P0 (0, 0)
  point P1 (0, 206.6831)
  dimension "d100" = 43
  dimension "d101" = 30
  dimension "d102" = 30
  dimension "d103" = 105
extrude "Extrusion18" cut sketch "Sketch19" against normal up to next
sketch "Sketch20" plane through (0, 0, -290) normal (-1, 0, 0) x (0, 0, 1)
  circle A0 centre (22, 22.1) radius 19
  circle A1 centre (198, 22.1) radius 19
  line L0 (0, 0) -> (220, 0) projected
  line L1 (0, 0) -> (0, 115) projected
  line L2 (0, 0) -> (0, 115) projected
  line L3 (22, 41.1) -> (0, 41.1)
  line L4 (41, 22.1) -> (41, 0)
  line L5 (218.1003, 0) -> (0, 0) projected
  line L6 (179, 22.1) -> (179, 0)
  line L7 (217.3868, 0) -> (217.3868, 55) projected
  line L8 (217, 22.1) -> (217, 0)
  point P0 (290, 0)
  dimension "d106" = 22.1
  dimension "d107" = 22.1
  dimension "d108" = 22
  dimension "d109" = 198
  dimension "d110" = 38
  dimension "d111" = 38
extrude "Extrusion19" cut sketch "Sketch20" against normal up to surface (140 mm away)
sketch "Sketch21" plane through (0, 0, -70) normal (-1, 0, 0) x (0, 0, 1)
  line L0 (-140, 67.5) -> (-70, 67.5)
  line L1 (-70, 67.5) -> (-70, 47.5)
  line L2 (-70, 47.5) -> (-140, 47.5)
  line L3 (-140, 47.5) -> (-140, 67.5)
  line L4 (-115, 92.5) -> (-95, 92.5)
  line L5 (-95, 92.5) -> (-95, 22.5)
  line L6 (-95, 22.5) -> (-115, 22.5)
  line L7 (-115, 22.5) -> (-115, 92.5)
  line L8 (-179, 0) -> (-41, 0) projected
  line L9 (-220, 41.1) -> (-220, 115) projected
  point P0 (70, 0)
  point P1 (-95, 57.5)
  point P2 (-105, 67.5)
  point P3 (-140, 57.5)
  point P4 (-70, 57.5)
  point P5 (-105, 92.5)
  point P6 (-115, 67.5)
  point P7 (-115, 47.5)
  point P8 (-95, 47.5)
  point P9 (-95, 67.5)
  dimension "d114" = 57.5
  dimension "d115" = 115
  dimension "d116" = 70
  dimension "d117" = 70
  dimension "d118" = 20
  dimension "d119" = 20
extrude "Extrusion20" cut sketch "Sketch21" against normal blind 0.5
sketch "Sketch22" plane through (140, 0, -70) normal (1, 0, 0) x (0, 0, -1)
  line L0 (115, 67.5) -> (115, 92.5) projected
  line L1 (140, 67.5) -> (115, 67.5) projected
  line L2 (140, 47.5) -> (140, 67.5) projected
  line L3 (115, 47.5) -> (140, 47.5) projected
  line L4 (115, 22.5) -> (115, 47.5) projected
  line L5 (95, 22.5) -> (115, 22.5) projected
  line L6 (95, 47.5) -> (95, 22.5) projected
  line L7 (70, 47.5) -> (95, 47.5) projected
  line L8 (70, 67.5) -> (70, 47.5) projected
  line L9 (95, 67.5) -> (70, 67.5) projected
  line L10 (95, 92.5) -> (95, 67.5) projected
  line L11 (115, 92.5) -> (95, 92.5) projected
  point P0 (-70, 0)
extrude "Extrusion21" cut sketch "Sketch22" against normal blind 0.5
sketch "Sketch23" plane through (0, 115, 0) normal (0, 1, 0) x (1, 0, 0)
  line L0 (102.5, 280) -> (37.5, 280)
  line L1 (37.5, 280) -> (37.5, 260)
  line L2 (37.5, 260) -> (102.5, 260)
  line L3 (102.5, 260) -> (102.5, 280)
  line L4 (0, 290) -> (0, 123.3662) projected
  line L5 (140, 290) -> (0, 290) projected
  circle A0 centre (102.5, 260) radius 1.5
  point P0 (0, 0)
  point P1 (70, 280)
  point P2 (37.5, 270)
  point P3 (102.5, 270)
  dimension "d124" = 70
  dimension "d125" = 65
  dimension "d126" = 20
  dimension "d127" = 20
  dimension "d128" = 3
extrude "Extrusion22" cut sketch "Sketch23" against normal up to next contours A0 L2 L3 | L3 L2 A0
pattern_linear "Rectangular Pattern1" count 2 spacing 65 along (-1, 0, 0) count 2 spacing 20 along (0, 0, -1) of "Extrusion22"
sketch "Sketch24" plane through (0, 0, 0) normal (0, -1, 0) x (1, 0, 0)
  line L0 (132.5, -235) -> (132.5, -134.3405)
  line L1 (7.5, -235) -> (7.5, -134.3405)
  line L2 (140, -290) -> (125, -290) projected
  line L3 (15, -290) -> (0, -290) projected
  line L4 (125, -111) -> (125, -249) projected
  line L5 (0, -249) -> (0, -111) projected
  circle A0 centre (132.5, -235) radius 1.5
  circle A1 centre (7.5, -235) radius 1.5
  point P0 (0, 0)
  point P1 (132.5, -290)
  dimension "d137" = 55
  dimension "d138" = 55
  dimension "d139" = 7.5
  dimension "d140" = 7.5
  dimension "d141" = 3
  dimension "d142" = 3
extrude "Extrusion23" cut sketch "Sketch24" against normal blind 15
pattern_linear "Rectangular Pattern2" count 8 spacing 15 along (0, 0, 1) of "Extrusion23"
sketch "Sketch25" plane through (0, 0, -70) normal (-1, 0, 0) x (0, 0, 1)
  line L0 (-175, 80) -> (-120, 80)
  line L1 (-120, 80) -> (-120, 55)
  line L2 (-120, 55) -> (-175, 55)
  line L3 (-175, 55) -> (-175, 80)
  line L4 (-179, 0) -> (-41, 0) projected
  line L5 (-220, 41.1) -> (-220, 115) projected
  point P0 (70, 0)
  point P1 (-120, 67.5)
  dimension "d148" = 80
  dimension "d149" = 55
  dimension "d150" = 45
  dimension "d151" = 100
extrude "Extrusion24" cut sketch "Sketch25" against normal up to surface (15 mm away)
sketch "Sketch26" plane through (0, 115, 0) normal (0, 1, 0) x (1, 0, 0)
  circle A0 centre (70, 199.5776) radius 70.1084
  line L0 (110, 142) -> (110, 247) projected
  line L1 (110, 142) -> (30, 142)
  circle A1 centre (102.5, 260) radius 1.5 projected
  point P0 (0, 0)
extrude "Extrusion25" cut sketch "Sketch26" against normal up to surface (15 mm away) contours L1 A0 picked at (80.2779, 140.2045)
sketch "Sketch27" plane through (0, 0, 0) normal (0, -1, 0) x (1, 0, 0)
  line L0 (0, 0) -> (140, 0)
  line L1 (140, 0) -> (140, -169)
  line L2 (140, -169) -> (0, -169)
  line L3 (0, -169) -> (0, 0)
  line L4 (125, -290) -> (15, -290) projected
  line L5 (140, -111) -> (140, -249) projected
  dimension "d157" = 121
extrude "Extrusion26" cut sketch "Sketch27" against normal up to next
properties part number "car_cover_back"
